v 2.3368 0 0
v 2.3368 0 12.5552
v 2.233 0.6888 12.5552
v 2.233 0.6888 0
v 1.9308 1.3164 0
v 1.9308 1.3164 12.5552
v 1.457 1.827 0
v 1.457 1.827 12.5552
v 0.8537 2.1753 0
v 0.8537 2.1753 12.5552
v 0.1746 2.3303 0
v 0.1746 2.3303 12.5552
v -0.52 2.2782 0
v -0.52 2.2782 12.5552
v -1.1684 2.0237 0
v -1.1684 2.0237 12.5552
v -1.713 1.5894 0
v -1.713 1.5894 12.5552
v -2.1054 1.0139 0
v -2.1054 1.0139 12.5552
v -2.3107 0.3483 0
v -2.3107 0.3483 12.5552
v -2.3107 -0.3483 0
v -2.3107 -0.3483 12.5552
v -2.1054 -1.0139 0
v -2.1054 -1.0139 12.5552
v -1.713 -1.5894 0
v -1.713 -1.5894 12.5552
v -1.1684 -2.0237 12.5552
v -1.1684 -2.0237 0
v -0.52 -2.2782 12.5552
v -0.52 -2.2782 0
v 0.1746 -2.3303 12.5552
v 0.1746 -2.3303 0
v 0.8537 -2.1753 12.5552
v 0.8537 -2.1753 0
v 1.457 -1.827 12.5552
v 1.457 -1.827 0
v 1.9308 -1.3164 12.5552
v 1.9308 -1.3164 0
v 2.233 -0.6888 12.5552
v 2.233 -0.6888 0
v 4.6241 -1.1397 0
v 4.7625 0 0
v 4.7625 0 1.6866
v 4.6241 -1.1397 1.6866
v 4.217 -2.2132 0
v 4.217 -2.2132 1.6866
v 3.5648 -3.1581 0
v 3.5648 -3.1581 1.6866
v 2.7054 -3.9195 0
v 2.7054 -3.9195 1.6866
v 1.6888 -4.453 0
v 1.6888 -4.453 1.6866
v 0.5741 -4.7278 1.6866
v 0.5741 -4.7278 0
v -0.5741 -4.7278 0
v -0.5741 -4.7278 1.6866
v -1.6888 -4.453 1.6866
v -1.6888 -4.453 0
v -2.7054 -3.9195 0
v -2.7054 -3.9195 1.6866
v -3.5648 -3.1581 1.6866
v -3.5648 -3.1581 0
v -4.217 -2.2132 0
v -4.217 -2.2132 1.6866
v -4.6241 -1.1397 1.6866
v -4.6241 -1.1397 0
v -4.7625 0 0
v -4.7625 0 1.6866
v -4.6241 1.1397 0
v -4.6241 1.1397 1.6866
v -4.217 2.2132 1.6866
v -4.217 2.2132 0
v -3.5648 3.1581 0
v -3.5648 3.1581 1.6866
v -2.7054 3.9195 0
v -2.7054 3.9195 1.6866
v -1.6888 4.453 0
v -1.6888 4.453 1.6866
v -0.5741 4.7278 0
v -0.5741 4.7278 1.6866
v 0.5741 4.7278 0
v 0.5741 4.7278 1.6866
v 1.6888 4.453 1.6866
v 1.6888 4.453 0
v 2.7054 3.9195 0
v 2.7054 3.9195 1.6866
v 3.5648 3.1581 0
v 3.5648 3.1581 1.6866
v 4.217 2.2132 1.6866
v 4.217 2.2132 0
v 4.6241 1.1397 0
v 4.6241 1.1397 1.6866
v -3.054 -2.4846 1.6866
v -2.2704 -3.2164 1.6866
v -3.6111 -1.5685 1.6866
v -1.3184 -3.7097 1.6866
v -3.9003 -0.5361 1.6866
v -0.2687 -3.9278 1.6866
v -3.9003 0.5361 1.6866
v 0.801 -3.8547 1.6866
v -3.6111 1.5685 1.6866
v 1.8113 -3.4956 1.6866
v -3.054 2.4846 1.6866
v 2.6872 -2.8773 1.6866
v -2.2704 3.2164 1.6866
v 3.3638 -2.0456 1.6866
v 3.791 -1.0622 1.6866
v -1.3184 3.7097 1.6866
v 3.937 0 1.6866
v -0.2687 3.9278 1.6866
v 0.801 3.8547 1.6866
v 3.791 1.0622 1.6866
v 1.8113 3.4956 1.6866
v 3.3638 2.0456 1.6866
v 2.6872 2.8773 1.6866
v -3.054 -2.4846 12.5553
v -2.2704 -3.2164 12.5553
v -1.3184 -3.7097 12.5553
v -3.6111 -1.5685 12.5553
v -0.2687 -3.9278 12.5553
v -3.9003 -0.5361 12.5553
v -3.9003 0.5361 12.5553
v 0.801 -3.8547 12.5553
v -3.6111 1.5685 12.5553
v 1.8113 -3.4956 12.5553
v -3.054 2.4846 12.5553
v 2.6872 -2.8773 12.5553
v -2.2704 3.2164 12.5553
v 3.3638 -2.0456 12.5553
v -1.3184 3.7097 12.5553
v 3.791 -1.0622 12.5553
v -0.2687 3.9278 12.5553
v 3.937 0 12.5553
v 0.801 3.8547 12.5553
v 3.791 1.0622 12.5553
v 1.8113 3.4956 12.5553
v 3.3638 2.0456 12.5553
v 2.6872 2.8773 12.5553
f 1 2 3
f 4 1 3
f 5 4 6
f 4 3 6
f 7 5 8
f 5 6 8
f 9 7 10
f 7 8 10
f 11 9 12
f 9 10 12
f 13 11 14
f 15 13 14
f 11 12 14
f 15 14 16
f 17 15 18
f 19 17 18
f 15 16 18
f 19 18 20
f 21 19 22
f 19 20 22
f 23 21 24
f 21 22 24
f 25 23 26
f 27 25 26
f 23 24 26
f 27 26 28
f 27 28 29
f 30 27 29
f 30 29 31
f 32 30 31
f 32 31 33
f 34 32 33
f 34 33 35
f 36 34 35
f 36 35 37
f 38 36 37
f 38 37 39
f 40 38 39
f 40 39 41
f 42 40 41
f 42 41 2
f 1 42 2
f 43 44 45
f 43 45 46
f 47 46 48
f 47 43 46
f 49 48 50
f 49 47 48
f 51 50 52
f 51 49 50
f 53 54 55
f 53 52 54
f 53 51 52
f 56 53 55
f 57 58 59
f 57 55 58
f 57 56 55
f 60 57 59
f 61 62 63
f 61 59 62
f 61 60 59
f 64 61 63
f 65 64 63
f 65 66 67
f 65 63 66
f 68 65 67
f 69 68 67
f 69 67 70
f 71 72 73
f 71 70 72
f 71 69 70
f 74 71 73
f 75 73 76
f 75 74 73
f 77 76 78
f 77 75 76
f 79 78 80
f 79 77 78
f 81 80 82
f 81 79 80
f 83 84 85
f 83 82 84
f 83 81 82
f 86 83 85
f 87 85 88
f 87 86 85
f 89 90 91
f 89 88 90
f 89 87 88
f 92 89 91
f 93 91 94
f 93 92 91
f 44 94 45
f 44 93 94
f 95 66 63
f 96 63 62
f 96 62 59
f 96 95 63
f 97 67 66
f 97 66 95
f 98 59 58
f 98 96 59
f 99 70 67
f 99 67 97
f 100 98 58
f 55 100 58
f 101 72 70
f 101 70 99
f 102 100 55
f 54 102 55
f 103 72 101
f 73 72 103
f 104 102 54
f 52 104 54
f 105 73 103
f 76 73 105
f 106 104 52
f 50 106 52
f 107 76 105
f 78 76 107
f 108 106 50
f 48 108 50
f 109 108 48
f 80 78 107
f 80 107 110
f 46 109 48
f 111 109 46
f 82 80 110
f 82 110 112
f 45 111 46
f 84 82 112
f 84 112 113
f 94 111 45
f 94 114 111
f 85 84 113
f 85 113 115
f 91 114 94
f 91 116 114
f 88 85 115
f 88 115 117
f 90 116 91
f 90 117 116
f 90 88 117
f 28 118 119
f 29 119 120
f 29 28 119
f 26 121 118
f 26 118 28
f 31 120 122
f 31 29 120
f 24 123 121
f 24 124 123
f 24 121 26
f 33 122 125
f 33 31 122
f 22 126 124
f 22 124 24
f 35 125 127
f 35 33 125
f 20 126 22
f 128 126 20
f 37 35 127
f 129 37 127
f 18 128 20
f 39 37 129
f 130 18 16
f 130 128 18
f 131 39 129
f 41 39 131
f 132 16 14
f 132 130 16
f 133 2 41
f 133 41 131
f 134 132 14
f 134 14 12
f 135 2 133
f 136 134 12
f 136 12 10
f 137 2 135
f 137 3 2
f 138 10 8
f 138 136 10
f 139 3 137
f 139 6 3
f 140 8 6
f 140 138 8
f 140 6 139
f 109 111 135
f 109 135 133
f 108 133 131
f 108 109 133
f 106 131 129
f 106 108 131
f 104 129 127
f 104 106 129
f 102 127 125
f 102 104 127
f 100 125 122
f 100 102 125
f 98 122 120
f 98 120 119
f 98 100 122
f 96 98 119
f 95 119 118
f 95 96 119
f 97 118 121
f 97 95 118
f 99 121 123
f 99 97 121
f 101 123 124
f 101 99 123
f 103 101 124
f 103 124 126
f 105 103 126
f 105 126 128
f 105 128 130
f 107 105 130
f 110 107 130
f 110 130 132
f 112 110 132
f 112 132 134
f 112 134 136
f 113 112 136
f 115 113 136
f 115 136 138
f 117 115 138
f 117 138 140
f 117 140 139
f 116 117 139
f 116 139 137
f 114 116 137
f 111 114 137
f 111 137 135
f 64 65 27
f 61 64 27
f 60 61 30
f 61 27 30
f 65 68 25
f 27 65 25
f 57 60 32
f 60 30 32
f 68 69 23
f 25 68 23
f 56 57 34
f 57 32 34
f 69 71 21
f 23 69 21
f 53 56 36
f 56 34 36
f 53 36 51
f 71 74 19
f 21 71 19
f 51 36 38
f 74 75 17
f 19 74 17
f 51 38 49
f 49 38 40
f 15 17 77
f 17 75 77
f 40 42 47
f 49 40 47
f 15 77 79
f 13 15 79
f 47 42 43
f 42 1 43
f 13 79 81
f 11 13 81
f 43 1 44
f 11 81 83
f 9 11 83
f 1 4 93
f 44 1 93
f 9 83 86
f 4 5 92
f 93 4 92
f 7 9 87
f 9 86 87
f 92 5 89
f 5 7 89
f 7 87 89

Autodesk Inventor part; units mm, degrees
ref_plane "YZ Plane" through (0, 0, 0) normal (1, 0, 0) x (0, 1, 0)
ref_plane "XZ Plane" through (0, 0, 0) normal (0, 1, 0) x (-1, 0, 0)
ref_plane "XY Plane" through (0, 0, 0) normal (0, 0, 1) x (1, 0, 0)
sketch "Sketch1" plane through (0, 0, 0) normal (0, 0, 1) x (1, 0, 0)
  circle A0 centre (0, 0) radius 4.7625
  dimension "d0" = 9.525
extrude "Extrusion1" add sketch "Sketch1" along normal blind 1.6866
sketch "Sketch2" plane through (0, 0, 1.6866) normal (0, 0, 1) x (1, 0, 0)
  circle A0 centre (0, 0) radius 4.7625 projected
  line L0 (-4.7625, 0) -> (-3.937, 0)
  circle A1 centre (0, 0) radius 3.937
  dimension "d3" = 0.8255
extrude "Extrusion2" add sketch "Sketch2" along normal blind 10.8687 contours A1
sketch "Sketch3" plane through (0, 0, 12.5552) normal (0, 0, 1) x (1, 0, 0)
  circle A0 centre (0, 0) radius 2.3368
  dimension "d6" = 4.6736
extrude "Extrusion3" cut sketch "Sketch3" against normal blind 31.9938
properties part number "Bushing" material "Copper, Cast"
